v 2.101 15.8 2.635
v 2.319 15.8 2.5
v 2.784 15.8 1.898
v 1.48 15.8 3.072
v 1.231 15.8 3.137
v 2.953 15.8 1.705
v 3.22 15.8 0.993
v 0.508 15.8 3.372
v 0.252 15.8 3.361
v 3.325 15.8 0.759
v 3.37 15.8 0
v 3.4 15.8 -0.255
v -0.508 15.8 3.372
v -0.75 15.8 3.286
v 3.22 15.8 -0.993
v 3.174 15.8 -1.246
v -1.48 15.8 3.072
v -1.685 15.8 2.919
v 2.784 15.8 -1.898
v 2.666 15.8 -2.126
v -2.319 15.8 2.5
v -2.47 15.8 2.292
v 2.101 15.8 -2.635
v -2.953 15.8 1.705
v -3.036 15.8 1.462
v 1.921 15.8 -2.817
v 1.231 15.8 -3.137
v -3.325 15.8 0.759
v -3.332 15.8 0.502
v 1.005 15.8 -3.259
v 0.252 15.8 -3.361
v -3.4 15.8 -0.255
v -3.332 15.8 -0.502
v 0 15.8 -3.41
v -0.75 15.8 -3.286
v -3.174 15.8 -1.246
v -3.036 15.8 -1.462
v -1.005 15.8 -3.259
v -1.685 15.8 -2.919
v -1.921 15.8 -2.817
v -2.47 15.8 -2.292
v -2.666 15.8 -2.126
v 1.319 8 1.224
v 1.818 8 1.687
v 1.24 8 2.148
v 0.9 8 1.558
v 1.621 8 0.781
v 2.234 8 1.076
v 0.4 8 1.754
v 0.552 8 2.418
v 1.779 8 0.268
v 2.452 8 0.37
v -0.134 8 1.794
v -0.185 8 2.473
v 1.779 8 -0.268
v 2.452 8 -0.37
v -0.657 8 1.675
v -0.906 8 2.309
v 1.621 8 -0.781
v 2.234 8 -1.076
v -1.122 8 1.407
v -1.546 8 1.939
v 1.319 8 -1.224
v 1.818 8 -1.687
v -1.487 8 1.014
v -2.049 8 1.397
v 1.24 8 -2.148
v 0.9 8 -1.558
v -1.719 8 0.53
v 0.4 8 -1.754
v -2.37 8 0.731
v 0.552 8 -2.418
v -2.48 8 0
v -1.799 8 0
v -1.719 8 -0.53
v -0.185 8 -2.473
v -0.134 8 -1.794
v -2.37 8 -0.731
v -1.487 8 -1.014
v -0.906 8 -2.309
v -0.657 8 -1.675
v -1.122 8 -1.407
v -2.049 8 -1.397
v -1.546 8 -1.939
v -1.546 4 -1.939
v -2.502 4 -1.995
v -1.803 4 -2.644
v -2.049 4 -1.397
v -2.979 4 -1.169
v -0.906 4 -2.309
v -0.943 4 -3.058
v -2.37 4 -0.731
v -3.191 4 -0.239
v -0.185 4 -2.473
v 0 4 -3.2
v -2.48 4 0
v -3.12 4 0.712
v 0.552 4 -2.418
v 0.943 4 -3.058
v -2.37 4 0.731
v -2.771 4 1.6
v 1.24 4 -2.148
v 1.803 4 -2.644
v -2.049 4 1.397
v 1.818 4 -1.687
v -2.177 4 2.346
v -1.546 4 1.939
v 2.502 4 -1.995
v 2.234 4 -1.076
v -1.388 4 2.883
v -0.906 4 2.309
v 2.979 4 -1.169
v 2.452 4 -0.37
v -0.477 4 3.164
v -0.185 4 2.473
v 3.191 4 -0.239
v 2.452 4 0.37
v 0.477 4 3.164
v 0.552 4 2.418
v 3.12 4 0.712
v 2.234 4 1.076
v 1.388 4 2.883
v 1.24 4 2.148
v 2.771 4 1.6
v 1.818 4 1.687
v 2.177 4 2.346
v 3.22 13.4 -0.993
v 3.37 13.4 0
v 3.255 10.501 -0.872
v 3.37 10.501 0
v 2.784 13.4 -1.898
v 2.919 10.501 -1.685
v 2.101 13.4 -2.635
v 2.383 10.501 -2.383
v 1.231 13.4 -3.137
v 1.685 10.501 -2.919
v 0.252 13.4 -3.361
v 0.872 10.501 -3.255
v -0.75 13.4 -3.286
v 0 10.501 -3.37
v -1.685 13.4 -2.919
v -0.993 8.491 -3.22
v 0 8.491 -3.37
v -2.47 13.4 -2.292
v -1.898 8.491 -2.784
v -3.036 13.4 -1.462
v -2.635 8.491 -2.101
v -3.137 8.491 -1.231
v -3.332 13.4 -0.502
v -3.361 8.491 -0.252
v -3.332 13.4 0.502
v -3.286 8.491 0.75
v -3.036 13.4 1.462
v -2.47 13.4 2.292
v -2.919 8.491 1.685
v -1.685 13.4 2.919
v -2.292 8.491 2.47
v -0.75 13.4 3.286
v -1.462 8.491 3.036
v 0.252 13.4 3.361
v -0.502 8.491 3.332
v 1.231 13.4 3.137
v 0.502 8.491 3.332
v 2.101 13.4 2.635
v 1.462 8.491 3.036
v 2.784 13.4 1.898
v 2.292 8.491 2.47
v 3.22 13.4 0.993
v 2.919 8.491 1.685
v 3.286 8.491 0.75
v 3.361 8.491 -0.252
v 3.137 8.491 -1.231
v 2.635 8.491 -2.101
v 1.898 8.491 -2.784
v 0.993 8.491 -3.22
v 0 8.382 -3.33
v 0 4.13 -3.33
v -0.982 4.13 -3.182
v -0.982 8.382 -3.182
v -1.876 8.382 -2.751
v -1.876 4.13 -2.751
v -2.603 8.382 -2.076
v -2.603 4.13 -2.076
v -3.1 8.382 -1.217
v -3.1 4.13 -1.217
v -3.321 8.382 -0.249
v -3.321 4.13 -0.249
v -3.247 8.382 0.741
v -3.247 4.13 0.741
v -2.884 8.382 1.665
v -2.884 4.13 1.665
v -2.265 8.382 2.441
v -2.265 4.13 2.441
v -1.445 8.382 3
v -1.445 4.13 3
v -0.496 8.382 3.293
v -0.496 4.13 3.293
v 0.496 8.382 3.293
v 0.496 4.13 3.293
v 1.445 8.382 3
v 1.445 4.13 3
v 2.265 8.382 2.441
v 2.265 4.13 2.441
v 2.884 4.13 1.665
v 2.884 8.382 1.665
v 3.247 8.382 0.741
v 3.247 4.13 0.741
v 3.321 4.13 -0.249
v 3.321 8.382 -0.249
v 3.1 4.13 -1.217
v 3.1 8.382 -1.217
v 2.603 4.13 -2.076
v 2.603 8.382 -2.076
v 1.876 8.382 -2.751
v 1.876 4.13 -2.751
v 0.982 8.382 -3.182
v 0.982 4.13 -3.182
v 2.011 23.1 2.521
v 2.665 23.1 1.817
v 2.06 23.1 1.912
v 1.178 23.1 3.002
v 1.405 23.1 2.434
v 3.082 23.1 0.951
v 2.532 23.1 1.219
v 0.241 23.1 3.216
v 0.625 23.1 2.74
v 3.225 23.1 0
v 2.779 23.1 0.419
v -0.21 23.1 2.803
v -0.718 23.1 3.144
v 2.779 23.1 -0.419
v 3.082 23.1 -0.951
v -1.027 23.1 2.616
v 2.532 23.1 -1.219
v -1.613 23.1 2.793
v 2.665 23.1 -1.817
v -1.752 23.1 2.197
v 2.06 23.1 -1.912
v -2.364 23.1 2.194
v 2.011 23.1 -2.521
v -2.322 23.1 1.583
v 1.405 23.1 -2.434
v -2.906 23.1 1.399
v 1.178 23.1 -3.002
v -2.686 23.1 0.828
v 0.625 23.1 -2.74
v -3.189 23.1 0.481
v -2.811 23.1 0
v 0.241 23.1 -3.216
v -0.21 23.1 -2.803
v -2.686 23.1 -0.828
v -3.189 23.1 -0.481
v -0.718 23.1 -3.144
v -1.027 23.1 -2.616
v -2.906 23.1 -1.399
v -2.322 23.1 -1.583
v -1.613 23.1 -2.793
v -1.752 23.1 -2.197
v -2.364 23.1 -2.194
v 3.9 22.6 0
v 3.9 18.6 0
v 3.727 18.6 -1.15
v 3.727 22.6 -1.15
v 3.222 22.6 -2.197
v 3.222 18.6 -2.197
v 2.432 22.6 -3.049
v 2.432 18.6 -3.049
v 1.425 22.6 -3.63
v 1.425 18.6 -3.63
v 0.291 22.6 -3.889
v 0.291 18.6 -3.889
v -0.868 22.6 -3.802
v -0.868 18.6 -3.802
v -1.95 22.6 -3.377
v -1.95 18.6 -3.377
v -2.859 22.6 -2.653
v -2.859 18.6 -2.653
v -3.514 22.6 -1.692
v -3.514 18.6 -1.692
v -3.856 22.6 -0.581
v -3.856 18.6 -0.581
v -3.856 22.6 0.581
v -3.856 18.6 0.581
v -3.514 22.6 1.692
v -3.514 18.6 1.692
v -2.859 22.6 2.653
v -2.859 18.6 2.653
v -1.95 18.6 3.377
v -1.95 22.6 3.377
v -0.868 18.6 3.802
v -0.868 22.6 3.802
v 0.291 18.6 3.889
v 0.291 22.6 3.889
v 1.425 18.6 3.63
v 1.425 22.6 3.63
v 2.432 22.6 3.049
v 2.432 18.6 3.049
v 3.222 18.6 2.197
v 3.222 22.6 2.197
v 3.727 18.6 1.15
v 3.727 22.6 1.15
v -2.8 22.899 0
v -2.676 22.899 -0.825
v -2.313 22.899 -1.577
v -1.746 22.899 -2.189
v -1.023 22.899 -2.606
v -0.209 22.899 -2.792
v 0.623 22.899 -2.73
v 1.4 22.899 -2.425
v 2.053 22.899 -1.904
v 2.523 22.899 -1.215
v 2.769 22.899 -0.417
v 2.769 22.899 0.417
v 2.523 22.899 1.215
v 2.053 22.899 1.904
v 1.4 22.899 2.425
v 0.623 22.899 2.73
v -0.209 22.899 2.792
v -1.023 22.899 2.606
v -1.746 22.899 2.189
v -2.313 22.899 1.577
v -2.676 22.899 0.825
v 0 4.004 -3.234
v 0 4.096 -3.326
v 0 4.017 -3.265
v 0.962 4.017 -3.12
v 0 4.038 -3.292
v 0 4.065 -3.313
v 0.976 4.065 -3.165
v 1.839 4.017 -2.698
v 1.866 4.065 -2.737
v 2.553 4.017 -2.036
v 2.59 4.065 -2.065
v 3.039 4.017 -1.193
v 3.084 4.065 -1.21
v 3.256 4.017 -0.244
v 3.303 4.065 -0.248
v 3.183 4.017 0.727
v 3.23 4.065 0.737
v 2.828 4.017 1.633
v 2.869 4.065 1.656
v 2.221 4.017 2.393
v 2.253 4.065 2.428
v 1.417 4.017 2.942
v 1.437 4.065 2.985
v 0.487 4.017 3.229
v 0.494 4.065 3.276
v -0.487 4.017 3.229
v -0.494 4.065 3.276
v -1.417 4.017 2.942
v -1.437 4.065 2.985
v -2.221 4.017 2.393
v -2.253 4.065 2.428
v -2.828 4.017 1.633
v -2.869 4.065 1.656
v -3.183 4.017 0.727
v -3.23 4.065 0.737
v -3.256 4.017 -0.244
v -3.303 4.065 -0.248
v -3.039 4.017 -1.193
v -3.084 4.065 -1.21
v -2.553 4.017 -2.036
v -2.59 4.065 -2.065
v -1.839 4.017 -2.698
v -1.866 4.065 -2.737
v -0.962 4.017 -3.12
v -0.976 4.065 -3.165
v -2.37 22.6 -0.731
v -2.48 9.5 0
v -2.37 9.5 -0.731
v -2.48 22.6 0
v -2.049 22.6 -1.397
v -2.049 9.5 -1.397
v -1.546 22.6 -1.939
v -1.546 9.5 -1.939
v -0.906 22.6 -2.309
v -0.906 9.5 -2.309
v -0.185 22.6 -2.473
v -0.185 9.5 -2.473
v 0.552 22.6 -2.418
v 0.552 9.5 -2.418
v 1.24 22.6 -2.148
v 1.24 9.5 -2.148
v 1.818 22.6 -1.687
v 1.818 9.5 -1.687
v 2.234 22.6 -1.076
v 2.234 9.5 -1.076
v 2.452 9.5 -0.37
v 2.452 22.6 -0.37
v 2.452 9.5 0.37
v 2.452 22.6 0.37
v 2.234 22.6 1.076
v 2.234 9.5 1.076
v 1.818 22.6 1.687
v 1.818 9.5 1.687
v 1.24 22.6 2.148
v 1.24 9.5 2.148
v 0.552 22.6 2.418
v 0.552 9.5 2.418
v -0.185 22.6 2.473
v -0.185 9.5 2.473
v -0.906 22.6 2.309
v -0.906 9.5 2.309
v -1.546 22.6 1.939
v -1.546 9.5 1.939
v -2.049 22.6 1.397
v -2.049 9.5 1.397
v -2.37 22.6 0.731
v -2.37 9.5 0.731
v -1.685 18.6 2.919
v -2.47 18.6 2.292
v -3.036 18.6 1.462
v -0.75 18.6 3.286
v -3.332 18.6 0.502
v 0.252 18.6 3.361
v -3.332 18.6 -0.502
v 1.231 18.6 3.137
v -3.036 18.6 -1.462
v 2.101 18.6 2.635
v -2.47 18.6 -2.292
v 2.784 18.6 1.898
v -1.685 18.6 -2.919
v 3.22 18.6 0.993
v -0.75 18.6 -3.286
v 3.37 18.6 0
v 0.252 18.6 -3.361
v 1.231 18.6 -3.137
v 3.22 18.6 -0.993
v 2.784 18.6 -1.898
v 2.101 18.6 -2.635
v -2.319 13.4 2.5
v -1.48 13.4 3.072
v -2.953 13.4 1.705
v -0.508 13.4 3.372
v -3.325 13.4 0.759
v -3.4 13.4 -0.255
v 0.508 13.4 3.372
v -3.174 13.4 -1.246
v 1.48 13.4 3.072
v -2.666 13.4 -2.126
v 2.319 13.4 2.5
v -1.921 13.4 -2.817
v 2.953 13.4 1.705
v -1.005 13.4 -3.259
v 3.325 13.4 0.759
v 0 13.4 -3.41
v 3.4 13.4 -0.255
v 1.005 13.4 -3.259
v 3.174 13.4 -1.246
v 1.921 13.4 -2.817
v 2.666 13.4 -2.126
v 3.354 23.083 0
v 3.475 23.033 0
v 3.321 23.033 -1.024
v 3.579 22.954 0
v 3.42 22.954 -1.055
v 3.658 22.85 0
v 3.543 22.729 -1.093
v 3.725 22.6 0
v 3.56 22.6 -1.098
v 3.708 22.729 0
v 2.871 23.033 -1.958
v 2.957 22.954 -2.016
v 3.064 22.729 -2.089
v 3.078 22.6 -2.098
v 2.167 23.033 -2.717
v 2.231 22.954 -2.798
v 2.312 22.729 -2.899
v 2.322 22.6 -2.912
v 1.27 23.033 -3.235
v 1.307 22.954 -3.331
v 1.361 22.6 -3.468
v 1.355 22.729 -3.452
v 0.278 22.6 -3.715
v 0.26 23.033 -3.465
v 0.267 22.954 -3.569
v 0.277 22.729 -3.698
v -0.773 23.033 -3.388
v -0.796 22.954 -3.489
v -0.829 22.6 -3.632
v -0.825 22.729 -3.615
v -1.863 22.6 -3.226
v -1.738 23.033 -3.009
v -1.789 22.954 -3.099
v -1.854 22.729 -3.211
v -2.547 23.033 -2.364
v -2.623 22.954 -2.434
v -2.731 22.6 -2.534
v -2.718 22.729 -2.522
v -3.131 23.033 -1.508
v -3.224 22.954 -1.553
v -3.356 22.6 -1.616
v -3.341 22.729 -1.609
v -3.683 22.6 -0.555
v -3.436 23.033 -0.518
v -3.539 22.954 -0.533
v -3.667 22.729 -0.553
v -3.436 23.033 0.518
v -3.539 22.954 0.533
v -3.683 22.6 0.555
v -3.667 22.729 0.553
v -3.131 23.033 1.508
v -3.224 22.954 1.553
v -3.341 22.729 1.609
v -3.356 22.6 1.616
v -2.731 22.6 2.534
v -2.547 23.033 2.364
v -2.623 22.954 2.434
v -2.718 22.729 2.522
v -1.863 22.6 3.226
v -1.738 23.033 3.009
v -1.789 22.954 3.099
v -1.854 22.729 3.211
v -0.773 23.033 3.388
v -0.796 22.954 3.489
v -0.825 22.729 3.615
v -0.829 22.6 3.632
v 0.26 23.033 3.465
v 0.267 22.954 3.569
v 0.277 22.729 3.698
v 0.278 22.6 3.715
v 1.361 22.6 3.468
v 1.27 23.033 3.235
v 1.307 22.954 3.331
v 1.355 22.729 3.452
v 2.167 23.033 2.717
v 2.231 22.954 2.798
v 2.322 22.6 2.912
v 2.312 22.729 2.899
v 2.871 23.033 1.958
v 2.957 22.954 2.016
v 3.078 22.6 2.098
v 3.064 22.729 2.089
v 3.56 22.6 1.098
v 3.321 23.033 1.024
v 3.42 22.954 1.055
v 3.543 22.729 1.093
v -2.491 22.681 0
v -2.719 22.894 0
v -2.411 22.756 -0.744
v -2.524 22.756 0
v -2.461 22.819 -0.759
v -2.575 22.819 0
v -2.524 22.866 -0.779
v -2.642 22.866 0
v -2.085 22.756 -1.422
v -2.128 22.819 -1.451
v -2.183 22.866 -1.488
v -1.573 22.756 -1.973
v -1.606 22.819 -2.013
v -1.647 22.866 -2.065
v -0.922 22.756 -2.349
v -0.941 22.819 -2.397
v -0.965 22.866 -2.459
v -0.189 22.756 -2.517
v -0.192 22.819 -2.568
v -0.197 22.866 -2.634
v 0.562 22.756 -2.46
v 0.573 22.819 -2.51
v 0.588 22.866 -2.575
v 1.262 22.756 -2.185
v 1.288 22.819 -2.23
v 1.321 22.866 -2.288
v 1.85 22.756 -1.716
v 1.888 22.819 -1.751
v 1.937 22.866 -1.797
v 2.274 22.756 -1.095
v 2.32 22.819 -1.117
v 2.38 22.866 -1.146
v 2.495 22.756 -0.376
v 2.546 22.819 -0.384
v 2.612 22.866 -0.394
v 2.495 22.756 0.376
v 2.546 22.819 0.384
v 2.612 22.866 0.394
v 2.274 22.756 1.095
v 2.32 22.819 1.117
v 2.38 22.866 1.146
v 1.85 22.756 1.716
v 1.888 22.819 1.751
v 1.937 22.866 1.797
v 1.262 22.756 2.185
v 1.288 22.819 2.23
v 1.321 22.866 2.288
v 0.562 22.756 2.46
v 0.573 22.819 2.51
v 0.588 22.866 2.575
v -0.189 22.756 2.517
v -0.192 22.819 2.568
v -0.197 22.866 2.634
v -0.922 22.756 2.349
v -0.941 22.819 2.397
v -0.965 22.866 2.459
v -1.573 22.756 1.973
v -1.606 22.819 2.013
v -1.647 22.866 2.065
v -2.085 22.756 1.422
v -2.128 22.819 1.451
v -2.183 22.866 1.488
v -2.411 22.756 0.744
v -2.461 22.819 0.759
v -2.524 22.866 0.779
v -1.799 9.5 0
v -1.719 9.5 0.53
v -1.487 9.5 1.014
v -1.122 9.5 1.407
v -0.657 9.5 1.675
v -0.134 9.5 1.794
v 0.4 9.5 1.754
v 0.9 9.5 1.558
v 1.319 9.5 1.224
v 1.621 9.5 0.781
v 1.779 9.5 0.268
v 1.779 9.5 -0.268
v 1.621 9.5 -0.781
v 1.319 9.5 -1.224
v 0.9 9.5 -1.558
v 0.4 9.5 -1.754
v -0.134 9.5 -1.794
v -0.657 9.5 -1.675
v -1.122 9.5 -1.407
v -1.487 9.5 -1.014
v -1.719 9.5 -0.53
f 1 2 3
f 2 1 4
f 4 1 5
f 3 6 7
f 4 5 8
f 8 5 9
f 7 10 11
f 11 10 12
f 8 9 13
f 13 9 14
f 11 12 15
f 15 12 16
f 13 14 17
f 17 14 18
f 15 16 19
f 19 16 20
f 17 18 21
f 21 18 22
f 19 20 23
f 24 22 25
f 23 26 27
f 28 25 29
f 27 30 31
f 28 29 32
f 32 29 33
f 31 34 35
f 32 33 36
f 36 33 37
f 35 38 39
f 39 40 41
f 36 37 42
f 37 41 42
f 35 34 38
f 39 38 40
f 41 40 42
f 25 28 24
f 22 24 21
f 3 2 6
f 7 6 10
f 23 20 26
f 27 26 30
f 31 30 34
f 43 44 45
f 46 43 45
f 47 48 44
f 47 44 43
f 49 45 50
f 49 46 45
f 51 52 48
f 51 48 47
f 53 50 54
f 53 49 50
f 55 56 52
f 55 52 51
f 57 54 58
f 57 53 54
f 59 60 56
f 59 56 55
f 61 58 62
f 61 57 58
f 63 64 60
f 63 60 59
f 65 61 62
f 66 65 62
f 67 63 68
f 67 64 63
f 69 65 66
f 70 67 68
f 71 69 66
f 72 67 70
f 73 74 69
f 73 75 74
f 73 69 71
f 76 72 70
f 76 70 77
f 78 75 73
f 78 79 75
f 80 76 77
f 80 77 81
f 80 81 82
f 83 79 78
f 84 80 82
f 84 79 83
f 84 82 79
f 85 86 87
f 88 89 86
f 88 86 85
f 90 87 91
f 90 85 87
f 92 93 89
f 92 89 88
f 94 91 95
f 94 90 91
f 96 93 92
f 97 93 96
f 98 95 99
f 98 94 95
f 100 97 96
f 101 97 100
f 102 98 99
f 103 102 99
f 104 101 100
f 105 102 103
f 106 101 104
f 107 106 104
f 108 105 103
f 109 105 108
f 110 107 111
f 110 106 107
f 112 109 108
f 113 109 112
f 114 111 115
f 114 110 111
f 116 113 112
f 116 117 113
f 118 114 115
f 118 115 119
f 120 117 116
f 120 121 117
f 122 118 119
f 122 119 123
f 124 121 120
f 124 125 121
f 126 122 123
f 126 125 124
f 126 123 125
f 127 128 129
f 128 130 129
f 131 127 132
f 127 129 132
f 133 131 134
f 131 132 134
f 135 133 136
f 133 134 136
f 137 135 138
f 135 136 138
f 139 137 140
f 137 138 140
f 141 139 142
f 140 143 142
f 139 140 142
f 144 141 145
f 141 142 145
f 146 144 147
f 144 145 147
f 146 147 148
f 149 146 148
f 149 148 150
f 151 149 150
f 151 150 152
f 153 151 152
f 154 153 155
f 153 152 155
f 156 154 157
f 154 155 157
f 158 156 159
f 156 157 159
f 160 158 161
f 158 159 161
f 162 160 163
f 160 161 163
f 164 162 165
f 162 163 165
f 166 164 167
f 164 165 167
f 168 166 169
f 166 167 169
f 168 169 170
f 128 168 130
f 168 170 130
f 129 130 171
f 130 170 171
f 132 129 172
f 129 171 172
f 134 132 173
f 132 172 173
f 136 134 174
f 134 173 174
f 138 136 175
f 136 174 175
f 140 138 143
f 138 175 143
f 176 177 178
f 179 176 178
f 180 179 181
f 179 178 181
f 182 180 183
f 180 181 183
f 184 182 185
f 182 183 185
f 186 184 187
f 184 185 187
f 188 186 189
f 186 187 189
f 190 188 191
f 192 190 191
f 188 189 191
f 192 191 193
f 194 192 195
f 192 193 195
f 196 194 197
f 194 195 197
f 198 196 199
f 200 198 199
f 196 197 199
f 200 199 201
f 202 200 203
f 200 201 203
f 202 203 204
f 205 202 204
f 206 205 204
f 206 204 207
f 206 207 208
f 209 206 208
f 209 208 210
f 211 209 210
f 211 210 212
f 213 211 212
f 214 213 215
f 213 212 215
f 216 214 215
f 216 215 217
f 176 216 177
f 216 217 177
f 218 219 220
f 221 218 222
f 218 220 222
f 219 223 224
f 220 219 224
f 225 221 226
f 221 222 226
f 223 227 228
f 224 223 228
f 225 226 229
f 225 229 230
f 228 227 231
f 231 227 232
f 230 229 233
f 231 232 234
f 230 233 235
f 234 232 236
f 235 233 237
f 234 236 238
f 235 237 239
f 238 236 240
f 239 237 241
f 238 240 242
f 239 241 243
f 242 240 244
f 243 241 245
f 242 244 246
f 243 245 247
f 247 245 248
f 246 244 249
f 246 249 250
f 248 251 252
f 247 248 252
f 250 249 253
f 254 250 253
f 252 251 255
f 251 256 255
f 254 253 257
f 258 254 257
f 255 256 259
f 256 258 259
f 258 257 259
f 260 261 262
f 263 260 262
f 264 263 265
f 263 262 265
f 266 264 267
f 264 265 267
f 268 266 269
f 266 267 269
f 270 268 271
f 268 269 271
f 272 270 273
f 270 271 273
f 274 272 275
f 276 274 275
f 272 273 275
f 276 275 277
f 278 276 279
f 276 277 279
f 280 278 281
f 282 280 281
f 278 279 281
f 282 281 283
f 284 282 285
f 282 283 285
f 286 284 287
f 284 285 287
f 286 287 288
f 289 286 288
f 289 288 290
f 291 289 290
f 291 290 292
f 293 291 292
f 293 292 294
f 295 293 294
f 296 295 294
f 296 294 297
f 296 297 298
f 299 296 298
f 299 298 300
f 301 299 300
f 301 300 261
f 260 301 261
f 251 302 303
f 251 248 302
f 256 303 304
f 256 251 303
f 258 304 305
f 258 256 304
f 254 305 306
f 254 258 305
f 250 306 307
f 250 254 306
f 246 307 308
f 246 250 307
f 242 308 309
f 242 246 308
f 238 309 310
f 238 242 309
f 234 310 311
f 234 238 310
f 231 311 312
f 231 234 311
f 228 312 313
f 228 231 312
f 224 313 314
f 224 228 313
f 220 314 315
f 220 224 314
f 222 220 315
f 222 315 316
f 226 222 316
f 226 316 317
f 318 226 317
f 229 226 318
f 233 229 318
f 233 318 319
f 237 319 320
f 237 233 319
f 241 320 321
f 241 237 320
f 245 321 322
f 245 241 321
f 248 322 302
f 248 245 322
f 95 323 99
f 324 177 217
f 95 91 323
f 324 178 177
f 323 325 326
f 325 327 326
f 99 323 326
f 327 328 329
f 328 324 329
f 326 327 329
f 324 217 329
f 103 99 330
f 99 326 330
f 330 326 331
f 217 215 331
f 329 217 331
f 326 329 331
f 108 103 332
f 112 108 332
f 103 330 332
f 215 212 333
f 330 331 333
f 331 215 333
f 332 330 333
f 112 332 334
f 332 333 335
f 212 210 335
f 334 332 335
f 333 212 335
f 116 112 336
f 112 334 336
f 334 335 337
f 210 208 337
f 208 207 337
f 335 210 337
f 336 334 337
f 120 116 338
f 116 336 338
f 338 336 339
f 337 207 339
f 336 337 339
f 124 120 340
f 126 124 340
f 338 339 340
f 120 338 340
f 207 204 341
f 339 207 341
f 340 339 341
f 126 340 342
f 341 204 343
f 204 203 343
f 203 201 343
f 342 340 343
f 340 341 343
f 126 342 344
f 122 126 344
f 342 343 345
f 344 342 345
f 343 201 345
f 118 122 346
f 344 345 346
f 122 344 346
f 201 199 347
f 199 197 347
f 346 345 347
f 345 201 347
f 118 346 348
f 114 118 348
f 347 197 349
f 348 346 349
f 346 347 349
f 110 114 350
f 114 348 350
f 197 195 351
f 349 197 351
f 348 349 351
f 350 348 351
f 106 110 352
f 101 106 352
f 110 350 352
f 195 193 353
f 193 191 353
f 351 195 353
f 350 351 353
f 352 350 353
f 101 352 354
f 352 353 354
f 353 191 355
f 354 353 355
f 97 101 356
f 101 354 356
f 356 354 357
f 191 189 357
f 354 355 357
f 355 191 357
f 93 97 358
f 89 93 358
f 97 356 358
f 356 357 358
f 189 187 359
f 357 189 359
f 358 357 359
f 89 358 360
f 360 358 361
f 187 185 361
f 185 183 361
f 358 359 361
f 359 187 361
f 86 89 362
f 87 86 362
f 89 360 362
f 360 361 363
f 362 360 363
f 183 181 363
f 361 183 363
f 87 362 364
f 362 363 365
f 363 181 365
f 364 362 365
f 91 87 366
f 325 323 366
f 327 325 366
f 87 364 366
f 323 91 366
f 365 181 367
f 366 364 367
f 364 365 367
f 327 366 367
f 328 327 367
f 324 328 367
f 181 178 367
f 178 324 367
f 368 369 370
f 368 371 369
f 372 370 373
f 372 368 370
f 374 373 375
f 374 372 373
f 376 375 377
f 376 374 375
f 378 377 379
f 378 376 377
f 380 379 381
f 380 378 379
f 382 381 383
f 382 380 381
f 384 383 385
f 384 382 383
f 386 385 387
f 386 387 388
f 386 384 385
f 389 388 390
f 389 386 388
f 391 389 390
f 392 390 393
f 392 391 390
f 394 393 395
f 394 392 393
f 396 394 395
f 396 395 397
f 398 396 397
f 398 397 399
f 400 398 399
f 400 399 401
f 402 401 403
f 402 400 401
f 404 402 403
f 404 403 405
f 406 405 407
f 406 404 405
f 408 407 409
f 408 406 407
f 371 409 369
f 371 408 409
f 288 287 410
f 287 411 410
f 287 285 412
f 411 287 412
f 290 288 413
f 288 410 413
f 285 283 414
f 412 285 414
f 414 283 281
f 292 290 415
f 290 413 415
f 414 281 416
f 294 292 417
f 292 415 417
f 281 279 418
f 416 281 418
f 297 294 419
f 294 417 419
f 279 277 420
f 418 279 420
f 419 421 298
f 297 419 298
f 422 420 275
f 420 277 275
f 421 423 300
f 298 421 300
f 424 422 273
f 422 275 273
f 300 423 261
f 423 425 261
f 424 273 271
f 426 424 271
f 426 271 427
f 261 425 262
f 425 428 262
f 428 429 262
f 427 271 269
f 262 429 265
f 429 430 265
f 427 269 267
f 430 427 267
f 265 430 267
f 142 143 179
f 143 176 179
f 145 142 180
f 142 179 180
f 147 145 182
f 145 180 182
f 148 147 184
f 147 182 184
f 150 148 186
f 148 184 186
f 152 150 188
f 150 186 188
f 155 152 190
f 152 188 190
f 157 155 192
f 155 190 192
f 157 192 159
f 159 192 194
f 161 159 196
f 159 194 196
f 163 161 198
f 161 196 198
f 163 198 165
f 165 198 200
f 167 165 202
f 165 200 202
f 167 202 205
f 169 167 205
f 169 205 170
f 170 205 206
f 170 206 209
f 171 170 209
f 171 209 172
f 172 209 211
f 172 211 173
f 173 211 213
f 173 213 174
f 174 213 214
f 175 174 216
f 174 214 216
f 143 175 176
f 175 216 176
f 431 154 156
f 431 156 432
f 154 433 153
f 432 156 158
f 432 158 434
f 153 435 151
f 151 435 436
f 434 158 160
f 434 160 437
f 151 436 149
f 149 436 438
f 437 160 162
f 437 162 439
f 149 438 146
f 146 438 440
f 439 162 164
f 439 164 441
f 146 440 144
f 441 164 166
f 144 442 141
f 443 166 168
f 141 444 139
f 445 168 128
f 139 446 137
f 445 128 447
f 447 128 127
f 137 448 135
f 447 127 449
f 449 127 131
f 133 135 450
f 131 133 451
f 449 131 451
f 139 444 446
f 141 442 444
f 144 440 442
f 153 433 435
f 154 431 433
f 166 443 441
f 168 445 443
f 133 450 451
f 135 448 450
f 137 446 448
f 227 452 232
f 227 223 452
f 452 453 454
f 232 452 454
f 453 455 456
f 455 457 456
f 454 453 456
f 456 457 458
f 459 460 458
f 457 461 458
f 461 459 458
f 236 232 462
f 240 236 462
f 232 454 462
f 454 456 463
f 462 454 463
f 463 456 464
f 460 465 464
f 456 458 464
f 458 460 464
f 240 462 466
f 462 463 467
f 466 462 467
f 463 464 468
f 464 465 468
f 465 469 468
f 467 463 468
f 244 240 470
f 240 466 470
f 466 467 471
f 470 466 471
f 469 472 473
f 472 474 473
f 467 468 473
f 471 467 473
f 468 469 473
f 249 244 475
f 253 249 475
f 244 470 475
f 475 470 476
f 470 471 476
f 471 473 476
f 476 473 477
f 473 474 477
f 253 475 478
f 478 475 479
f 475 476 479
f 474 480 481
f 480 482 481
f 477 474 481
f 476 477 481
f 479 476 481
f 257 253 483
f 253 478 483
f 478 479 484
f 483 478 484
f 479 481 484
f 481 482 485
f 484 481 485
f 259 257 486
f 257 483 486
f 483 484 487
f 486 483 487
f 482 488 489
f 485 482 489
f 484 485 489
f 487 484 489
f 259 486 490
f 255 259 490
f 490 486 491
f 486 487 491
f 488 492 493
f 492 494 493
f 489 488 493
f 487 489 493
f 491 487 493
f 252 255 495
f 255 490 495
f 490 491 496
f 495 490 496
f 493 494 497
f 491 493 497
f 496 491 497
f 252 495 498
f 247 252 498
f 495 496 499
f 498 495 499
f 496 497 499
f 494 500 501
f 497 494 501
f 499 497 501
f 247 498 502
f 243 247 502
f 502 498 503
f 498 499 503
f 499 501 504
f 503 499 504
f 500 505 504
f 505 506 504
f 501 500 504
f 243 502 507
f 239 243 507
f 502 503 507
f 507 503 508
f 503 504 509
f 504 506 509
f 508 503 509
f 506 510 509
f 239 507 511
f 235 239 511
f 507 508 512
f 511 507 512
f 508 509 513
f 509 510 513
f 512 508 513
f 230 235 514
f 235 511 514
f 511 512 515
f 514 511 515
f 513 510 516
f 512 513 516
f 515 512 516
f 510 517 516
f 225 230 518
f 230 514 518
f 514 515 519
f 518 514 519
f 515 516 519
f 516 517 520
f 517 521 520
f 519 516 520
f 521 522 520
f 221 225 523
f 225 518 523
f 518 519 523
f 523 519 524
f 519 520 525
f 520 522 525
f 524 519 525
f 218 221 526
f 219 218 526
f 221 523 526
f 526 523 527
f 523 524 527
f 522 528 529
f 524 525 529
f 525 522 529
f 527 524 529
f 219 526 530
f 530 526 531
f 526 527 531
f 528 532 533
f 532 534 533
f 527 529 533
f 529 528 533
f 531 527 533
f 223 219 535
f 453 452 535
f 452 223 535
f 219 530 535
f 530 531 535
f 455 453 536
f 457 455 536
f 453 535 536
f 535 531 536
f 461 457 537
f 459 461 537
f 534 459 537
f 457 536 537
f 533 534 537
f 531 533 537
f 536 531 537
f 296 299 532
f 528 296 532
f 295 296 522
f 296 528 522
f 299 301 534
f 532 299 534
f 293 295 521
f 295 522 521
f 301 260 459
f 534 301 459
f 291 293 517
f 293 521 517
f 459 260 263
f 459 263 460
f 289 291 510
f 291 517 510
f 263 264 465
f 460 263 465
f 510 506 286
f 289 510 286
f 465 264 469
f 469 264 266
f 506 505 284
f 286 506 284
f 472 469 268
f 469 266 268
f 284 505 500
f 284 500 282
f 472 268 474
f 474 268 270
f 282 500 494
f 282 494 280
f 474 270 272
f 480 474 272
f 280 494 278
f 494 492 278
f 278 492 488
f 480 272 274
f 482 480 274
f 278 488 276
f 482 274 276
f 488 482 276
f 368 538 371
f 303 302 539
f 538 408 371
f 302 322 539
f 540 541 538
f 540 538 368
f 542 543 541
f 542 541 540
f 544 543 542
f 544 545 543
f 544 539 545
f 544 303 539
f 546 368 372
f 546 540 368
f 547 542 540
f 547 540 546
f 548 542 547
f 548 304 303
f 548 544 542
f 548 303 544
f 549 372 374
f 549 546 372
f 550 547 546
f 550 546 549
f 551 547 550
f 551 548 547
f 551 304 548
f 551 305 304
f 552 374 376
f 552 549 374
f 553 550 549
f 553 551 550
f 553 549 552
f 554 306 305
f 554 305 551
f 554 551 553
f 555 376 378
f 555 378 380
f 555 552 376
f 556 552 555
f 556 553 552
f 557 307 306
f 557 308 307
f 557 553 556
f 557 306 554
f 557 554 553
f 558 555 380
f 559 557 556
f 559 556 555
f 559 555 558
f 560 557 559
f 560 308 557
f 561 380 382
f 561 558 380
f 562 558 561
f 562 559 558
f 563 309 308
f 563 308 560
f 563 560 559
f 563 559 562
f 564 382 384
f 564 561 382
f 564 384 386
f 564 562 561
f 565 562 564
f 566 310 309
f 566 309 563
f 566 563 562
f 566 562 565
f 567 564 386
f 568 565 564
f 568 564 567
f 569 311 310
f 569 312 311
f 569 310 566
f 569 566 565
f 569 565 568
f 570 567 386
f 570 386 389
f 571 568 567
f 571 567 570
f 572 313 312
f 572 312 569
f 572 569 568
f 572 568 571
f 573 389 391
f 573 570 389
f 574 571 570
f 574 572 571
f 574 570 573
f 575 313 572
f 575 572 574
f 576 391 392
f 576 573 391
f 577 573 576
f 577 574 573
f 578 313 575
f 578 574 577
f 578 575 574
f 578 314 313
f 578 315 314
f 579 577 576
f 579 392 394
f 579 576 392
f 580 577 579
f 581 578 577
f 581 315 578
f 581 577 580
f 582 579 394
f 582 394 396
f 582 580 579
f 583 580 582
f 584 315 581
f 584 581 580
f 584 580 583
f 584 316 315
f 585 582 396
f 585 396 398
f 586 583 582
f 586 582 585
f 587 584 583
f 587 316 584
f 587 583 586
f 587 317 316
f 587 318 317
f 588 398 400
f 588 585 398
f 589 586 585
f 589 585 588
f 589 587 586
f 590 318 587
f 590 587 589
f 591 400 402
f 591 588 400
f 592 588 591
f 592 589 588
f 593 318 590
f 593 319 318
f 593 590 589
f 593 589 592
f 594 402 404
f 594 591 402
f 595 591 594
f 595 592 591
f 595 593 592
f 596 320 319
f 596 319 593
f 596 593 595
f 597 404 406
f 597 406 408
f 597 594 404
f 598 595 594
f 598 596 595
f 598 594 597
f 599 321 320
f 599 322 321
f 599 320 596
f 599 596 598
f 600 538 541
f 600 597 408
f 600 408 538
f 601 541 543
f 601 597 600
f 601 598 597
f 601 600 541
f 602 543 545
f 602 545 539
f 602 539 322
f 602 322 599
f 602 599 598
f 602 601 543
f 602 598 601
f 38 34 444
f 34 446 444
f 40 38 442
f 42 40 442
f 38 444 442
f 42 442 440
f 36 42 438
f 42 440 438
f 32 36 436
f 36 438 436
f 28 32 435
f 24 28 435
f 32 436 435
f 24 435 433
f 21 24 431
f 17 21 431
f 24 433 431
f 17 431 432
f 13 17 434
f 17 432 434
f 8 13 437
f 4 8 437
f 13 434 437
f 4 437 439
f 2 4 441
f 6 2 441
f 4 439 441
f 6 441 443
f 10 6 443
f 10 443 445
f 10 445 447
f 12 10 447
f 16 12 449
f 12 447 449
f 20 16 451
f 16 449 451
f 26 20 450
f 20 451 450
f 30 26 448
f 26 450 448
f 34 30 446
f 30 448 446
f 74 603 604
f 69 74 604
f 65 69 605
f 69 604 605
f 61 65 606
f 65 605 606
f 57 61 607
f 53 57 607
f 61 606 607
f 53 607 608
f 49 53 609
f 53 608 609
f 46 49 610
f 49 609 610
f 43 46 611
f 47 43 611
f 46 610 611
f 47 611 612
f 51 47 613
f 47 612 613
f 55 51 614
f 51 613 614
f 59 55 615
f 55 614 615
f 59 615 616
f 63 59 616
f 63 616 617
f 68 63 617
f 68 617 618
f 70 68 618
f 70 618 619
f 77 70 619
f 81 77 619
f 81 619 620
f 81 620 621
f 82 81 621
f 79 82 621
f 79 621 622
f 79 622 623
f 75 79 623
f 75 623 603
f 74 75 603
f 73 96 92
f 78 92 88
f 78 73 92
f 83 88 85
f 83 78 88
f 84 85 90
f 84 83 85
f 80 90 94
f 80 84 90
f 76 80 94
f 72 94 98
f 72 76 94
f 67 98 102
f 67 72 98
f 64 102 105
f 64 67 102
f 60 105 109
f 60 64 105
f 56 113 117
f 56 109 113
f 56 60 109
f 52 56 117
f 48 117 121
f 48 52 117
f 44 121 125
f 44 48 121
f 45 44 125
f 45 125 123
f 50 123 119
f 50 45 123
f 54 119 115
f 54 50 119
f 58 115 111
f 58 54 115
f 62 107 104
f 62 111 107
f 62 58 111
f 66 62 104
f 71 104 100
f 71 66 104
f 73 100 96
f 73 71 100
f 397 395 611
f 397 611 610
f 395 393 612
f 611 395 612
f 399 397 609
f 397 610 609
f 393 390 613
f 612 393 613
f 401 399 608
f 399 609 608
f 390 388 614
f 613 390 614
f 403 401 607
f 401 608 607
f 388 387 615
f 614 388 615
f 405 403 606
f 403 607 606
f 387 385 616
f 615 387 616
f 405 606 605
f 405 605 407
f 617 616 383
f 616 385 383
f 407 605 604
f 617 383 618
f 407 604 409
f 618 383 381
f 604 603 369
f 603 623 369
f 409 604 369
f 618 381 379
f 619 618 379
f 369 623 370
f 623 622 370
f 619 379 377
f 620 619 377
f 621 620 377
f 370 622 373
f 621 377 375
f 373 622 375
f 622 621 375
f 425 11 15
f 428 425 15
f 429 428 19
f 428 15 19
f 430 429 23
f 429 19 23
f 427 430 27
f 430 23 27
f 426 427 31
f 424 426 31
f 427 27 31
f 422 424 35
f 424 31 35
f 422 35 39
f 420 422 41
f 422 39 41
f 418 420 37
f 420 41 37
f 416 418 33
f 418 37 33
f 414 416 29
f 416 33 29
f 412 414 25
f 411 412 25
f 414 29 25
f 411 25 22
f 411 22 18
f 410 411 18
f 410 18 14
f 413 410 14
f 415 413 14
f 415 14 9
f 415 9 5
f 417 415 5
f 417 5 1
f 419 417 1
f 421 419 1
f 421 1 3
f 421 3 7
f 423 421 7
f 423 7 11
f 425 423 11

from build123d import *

# Parameters (mm, degrees)
ESBO_O3_R                  = 1.5
CORTE_EXTRUS_O1_DEPTH      = 1.8
CORTE_EXTRUS_O2_DEPTH      = 24.74931578
CORTE_EXTRUS_O2_DEPTH_BACK = 24.74931578
FILETE1_R                  = 0.2
ESBO_O12_R                 = 4.66979075
CORTE_EXTRUS_O3_DEPTH      = 4
ESBO_O15_R                 = 2.353382699
RESSALTO_EXTRUS_O2_DEPTH   = 1
FILETE2_R                  = 0.13
CORTE_EXTRUS_O4_DEPTH      = 20.400515457
CORTE_EXTRUS_O4_DEPTH_BACK = 20.400515457
ESBO_O16_R                 = 2.48
ESBO_O18_R                 = 2.48
RESSALTO_EXTRUS_O3_DEPTH   = 1.5
ESBO_O19_R                 = 0.75
RESSALTO_EXTRUS_O4_DEPTH   = 4
FILETE3_R                  = 0.5
ESBO_O20_R                 = 1.799226356
CORTE_EXTRUS_O5_DEPTH      = 10


with BuildPart() as part:
    # Esboço1 → Revolução1 (revolve)
    with BuildSketch(Plane.XY, mode=Mode.PRIVATE) as revolu_o1_sk:
        with BuildLine():
            Line((-3.37, 10.501320708), (-3.41, 10.501320708))
            Line((-3.41, 10.501320708), (-3.41, 8.101320708))
            Line((-3.41, 8.101320708), (-3.37, 8.101320708))
            Line((-3.37, 8.101320708), (-3.37, 4.101320708))
            Line((-3.37, 4.101320708), (-2.725, 2.329197773))
            Line((-2.725, 2.329197773), (-2.725, 0))
            Line((-2.725, 0), (0, 0))
            Line((0, 0), (0, 23.1))
            Line((0, 23.1), (-3.225, 23.1))
            ThreePointArc((-3.225, 23.1), (-3.578553391, 22.953553391), (-3.725, 22.6))
            Line((-3.725, 22.6), (-3.9, 22.6))
            Line((-3.9, 22.6), (-3.9, 18.6))
            Line((-3.9, 18.6), (-3.37, 18.6))
            Line((-3.37, 18.6), (-3.37, 15.8))
            Line((-3.37, 15.8), (-3.43, 15.8))
            Line((-3.43, 15.8), (-3.43, 13.4))
            Line((-3.43, 13.4), (-3.37, 13.4))
            Line((-3.37, 13.4), (-3.37, 10.501320708))
        make_face()
    revolve(revolu_o1_sk.sketch.rotate(Axis((0, 0, 0), (0, 1, 0)), 180), axis=Axis((0, 0, 0), (0, 1, 0)))

    # Esboço3 → Corte-extrusão1 (cut)
    with BuildSketch(Plane.XZ):
        Circle(ESBO_O3_R)
    extrude(amount=-CORTE_EXTRUS_O1_DEPTH, mode=Mode.SUBTRACT)

    # Esboço5 → Corte-extrusão2 (cut, two sides: drawn at the far end of the back side and taken through both)
    with BuildSketch(Plane(origin=(0, 0, 0), x_dir=(0, 0, -1), z_dir=(1, 0, 0)).offset(-CORTE_EXTRUS_O2_DEPTH_BACK)):
        Polygon((-0.589187623, 0), (0.589187623, 0), (0.4, 1.8), (-0.4, 1.8), align=None)
    extrude(amount=CORTE_EXTRUS_O2_DEPTH + CORTE_EXTRUS_O2_DEPTH_BACK, mode=Mode.SUBTRACT)

    # Esboço6 → Corte-Revolução1 (revolve, cut)
    with BuildSketch(Plane.XY, mode=Mode.PRIVATE) as corte_revolu_o1_sk:
        with BuildLine():
            Line((2.810516533, 23.1), (0, 23.1))
            Line((0, 23.1), (0, 22.6))
            Line((0, 22.6), (0, 3.9))
            ThreePointArc((0, 3.9), (0.790569415, 3.771708245), (1.5, 3.4))
            Line((1.5, 3.4), (1.75, 3.4))
            Line((1.75, 3.4), (1.75, 6.491111566))
            Line((1.75, 6.491111566), (2.45, 9.103547132))
            Line((2.45, 9.103547132), (2.45, 9.822456454))
            Line((2.45, 9.822456454), (2.26, 10.9))
            Line((2.26, 10.9), (2.46, 10.9))
            Line((2.46, 10.9), (2.46, 12.094100045))
            Line((2.46, 12.094100045), (2.265, 13.2))
            Line((2.265, 13.2), (2.465, 13.2))
            Line((2.465, 13.2), (2.48, 16.765743636))
            Line((2.48, 16.765743636), (2.28, 17.9))
            Line((2.28, 17.9), (2.48, 17.9))
            Line((2.48, 17.9), (2.48, 22.6))
            ThreePointArc((2.48, 22.6), (2.575060985, 22.819089023), (2.8, 22.899332591))
            Line((2.8, 22.899332591), (2.810516533, 23.1))
        make_face()
    revolve(corte_revolu_o1_sk.sketch.rotate(Axis((0, 22.6, 0), (0, -1, 0)), 180), axis=Axis((0, 22.6, 0), (0, -1, 0)), mode=Mode.SUBTRACT)

    # Filete1
    filete1_edges = [part.edges().sort_by_distance(p)[0] for p in [
        (1.75, 3.4, 0),
    ]]
    fillet(filete1_edges, radius=FILETE1_R)

    # Esboço9 → Corte-Revolução2 (revolve, cut)
    with BuildSketch(Plane.XY, mode=Mode.PRIVATE) as corte_revolu_o2_sk:
        Polygon((-6.004910607, 22.6), (-3.9, 22.6), (-3.9, 18.6), (-3.37, 18.6), (-3.37, 15.8), (-3.41, 15.8), (-3.41, 13.4), (-3.37, 13.4), (-3.37, 8.491421612), (-3.33, 8.381522515), (-3.33, 3.991421612), (-2.725, 2.329197773), (-6.004910607, 2.329197773), align=None)
    revolve(corte_revolu_o2_sk.sketch.rotate(Axis((0, 0, 0), (0, 1, 0)), 270), axis=Axis((0, 0, 0), (0, 1, 0)), mode=Mode.SUBTRACT)

    # Esboço12 → Corte-extrusão3 (cut)
    with BuildSketch(Plane.XZ):
        Circle(ESBO_O12_R)
    extrude(amount=-CORTE_EXTRUS_O3_DEPTH, mode=Mode.SUBTRACT)

    # Esboço15 → Ressalto-extrusão2 (add)
    with BuildSketch(Plane(origin=(0, 4.5, 0), x_dir=(-1, 0, 0), z_dir=(0, -1, 0))):
        Circle(ESBO_O15_R)
    extrude(amount=-RESSALTO_EXTRUS_O2_DEPTH)

    # Filete2
    filete2_edges = [part.edges().sort_by_distance(p)[0] for p in [
        (1.75, 4, 0),
        (0, 4, 3.33),
        (1.75, 6.491111566, 0),
        (2.45, 9.103547132, 0),
    ]]
    fillet(filete2_edges, radius=FILETE2_R)

    # Esboço16 → Corte-extrusão4 (cut, two sides: drawn at the far end of the back side and taken through both)
    with BuildSketch(Plane.XZ.offset(-4.5).offset(-CORTE_EXTRUS_O4_DEPTH_BACK)):
        with Locations(Location((0, 0, 0), (0, 0, 180))):
            Circle(ESBO_O16_R)
    extrude(amount=CORTE_EXTRUS_O4_DEPTH + CORTE_EXTRUS_O4_DEPTH_BACK, mode=Mode.SUBTRACT)

    # Esboço18 → Ressalto-extrusão3 (add)
    with BuildSketch(Plane(origin=(0, 8, 0), x_dir=(-1, 0, 0), z_dir=(0, -1, 0))):
        Circle(ESBO_O18_R)
    extrude(amount=-RESSALTO_EXTRUS_O3_DEPTH)

    # Esboço19 → Ressalto-extrusão4 (add)
    with BuildSketch(Plane.XZ.offset(-8)):
        Circle(ESBO_O19_R)
    extrude(amount=RESSALTO_EXTRUS_O4_DEPTH)

    # Filete3
    filete3_edges = [part.edges().sort_by_distance(p)[0] for p in [
        (-0.75, 4, 0),
    ]]
    fillet(filete3_edges, radius=FILETE3_R)

    # Esboço20 → Corte-extrusão5 (cut)
    with BuildSketch(Plane(origin=(0, 9.5, 0), x_dir=(1, 0, 0), z_dir=(0, 1, 0))):
        with Locations(Location((0, 0, 0), (0, 0, 180))):
            Circle(ESBO_O20_R)
    extrude(amount=-CORTE_EXTRUS_O5_DEPTH, mode=Mode.SUBTRACT)


solid = part.part
